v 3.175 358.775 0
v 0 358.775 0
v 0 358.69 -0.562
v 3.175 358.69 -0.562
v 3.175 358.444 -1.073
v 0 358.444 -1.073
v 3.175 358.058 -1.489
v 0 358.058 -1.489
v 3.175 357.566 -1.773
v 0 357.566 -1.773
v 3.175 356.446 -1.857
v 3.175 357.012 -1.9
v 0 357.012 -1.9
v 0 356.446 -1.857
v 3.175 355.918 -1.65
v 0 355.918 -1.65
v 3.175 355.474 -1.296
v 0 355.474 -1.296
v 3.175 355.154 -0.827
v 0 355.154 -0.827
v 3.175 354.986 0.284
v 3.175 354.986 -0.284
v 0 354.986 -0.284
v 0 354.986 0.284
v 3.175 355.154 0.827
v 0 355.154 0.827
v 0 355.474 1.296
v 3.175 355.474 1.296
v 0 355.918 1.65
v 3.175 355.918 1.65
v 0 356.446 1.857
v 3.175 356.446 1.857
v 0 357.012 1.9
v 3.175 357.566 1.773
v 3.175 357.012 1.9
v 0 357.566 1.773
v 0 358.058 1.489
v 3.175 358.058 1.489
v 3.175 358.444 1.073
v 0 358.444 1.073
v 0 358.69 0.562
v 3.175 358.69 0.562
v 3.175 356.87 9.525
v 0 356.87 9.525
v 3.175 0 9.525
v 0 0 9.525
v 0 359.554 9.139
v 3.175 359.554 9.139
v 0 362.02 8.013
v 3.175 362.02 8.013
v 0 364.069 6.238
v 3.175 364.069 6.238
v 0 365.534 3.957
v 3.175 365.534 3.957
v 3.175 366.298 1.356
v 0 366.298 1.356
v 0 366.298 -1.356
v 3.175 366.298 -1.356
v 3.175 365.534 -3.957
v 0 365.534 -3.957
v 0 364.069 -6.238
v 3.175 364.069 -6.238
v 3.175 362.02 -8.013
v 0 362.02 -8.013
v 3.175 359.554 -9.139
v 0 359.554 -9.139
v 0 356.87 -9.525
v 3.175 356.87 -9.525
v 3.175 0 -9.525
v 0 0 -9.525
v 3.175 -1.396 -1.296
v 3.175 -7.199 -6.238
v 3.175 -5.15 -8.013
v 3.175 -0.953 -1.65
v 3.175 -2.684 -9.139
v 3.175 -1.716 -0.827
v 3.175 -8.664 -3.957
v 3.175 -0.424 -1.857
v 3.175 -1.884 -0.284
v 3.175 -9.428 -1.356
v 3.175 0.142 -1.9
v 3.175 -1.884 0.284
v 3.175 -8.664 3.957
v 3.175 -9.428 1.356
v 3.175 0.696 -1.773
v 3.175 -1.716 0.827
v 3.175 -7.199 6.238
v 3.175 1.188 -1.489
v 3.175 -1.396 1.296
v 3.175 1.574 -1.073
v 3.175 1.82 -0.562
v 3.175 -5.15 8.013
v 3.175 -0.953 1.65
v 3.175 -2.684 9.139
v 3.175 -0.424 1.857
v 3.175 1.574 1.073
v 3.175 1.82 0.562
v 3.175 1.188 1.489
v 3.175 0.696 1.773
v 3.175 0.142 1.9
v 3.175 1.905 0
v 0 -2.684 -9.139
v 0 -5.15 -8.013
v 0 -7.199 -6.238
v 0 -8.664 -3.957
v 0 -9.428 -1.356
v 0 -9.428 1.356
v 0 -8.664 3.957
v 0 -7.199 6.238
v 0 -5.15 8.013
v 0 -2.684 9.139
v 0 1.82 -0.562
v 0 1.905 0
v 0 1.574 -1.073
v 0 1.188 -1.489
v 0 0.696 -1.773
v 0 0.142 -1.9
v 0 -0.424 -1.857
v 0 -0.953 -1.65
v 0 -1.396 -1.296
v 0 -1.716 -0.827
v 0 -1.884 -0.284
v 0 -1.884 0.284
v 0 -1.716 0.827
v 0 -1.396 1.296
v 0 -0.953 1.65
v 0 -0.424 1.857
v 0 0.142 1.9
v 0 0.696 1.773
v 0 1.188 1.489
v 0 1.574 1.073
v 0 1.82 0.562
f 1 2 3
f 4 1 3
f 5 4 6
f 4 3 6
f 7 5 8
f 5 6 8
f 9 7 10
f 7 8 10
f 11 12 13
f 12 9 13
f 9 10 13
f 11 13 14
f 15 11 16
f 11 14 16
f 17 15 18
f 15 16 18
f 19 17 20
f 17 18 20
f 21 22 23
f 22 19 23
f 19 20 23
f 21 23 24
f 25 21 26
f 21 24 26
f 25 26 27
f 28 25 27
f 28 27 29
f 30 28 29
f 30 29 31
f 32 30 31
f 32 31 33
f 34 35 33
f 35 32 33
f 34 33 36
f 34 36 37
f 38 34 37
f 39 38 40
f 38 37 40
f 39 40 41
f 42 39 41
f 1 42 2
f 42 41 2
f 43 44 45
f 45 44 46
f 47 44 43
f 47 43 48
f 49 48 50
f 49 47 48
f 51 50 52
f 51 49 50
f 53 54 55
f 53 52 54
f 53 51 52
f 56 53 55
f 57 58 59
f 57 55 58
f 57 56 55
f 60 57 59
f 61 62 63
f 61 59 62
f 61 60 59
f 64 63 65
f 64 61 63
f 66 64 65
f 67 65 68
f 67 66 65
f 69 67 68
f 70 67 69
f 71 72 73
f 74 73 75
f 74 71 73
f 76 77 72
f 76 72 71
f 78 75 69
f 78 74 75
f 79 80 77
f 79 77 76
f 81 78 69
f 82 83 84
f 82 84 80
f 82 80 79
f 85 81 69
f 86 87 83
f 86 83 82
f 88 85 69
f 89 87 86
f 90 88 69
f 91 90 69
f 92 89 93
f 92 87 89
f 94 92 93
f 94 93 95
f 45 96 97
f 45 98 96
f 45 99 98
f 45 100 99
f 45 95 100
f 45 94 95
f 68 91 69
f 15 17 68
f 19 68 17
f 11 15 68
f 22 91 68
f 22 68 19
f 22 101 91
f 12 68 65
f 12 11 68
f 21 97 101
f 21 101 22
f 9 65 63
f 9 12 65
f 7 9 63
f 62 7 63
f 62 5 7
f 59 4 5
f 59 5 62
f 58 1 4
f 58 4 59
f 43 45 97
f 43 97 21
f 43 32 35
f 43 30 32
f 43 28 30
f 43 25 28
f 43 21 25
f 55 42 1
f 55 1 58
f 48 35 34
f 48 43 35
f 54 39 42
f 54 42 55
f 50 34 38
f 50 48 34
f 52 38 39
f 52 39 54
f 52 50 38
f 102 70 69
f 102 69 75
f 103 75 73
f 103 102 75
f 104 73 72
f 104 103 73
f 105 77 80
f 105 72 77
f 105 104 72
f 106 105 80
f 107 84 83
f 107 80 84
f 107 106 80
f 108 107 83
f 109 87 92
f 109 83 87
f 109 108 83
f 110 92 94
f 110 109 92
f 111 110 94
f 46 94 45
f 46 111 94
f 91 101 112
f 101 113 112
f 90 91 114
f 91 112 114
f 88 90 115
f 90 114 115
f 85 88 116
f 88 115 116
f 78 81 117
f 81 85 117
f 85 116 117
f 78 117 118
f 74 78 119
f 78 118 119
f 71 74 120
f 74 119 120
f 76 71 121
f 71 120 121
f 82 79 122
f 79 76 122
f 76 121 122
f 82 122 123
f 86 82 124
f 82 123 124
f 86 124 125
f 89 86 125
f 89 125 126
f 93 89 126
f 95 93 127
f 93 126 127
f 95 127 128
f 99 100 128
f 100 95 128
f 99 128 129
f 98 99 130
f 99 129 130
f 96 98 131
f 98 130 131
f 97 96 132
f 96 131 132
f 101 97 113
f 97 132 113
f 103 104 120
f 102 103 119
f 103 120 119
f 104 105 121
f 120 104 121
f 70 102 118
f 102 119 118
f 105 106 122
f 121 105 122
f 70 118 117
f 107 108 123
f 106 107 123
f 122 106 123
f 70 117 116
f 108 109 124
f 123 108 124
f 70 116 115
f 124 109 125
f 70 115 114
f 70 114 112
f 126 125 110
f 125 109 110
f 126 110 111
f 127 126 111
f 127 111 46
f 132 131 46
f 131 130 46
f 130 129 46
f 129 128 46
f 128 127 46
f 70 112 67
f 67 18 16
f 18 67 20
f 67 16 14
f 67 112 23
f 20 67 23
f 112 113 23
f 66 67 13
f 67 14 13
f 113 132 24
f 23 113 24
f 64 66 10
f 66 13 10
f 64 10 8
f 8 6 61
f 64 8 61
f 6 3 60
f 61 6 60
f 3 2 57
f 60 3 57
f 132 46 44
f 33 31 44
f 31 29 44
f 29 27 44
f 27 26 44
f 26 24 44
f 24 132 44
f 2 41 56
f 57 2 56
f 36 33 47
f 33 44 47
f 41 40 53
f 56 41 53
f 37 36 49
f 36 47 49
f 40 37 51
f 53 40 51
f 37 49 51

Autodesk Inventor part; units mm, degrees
ref_plane "YZ Plane" through (0, 0, 0) normal (1, 0, 0) x (0, 1, 0)
ref_plane "XZ Plane" through (0, 0, 0) normal (0, 1, 0) x (-1, 0, 0)
ref_plane "XY Plane" through (0, 0, 0) normal (0, 0, 1) x (1, 0, 0)
sketch "Sketch1" plane through (0, 0, 0) normal (1, 0, 0) x (0, 1, 0)
  circle A0 centre (0, 0) radius 1.905
  line L0 (0, 0) -> (356.87, 0) construction
  circle A1 centre (356.87, 0) radius 1.905
  arc A2 (0, 9.525) -> (0, -9.525) centre (0, 0) ccw
  arc A3 (356.87, -9.525) -> (356.87, 9.525) centre (356.87, 0) ccw
  line L1 (356.87, -9.525) -> (0, -9.525)
  line L2 (356.87, 9.525) -> (0, 9.525)
  dimension "d0" = 3.81
  dimension "d1" = 356.87
  dimension "d2" = 19.05
extrude "Extrusion1" add sketch "Sketch1" along normal blind 3.175
properties part number "Tie Rod 2"
